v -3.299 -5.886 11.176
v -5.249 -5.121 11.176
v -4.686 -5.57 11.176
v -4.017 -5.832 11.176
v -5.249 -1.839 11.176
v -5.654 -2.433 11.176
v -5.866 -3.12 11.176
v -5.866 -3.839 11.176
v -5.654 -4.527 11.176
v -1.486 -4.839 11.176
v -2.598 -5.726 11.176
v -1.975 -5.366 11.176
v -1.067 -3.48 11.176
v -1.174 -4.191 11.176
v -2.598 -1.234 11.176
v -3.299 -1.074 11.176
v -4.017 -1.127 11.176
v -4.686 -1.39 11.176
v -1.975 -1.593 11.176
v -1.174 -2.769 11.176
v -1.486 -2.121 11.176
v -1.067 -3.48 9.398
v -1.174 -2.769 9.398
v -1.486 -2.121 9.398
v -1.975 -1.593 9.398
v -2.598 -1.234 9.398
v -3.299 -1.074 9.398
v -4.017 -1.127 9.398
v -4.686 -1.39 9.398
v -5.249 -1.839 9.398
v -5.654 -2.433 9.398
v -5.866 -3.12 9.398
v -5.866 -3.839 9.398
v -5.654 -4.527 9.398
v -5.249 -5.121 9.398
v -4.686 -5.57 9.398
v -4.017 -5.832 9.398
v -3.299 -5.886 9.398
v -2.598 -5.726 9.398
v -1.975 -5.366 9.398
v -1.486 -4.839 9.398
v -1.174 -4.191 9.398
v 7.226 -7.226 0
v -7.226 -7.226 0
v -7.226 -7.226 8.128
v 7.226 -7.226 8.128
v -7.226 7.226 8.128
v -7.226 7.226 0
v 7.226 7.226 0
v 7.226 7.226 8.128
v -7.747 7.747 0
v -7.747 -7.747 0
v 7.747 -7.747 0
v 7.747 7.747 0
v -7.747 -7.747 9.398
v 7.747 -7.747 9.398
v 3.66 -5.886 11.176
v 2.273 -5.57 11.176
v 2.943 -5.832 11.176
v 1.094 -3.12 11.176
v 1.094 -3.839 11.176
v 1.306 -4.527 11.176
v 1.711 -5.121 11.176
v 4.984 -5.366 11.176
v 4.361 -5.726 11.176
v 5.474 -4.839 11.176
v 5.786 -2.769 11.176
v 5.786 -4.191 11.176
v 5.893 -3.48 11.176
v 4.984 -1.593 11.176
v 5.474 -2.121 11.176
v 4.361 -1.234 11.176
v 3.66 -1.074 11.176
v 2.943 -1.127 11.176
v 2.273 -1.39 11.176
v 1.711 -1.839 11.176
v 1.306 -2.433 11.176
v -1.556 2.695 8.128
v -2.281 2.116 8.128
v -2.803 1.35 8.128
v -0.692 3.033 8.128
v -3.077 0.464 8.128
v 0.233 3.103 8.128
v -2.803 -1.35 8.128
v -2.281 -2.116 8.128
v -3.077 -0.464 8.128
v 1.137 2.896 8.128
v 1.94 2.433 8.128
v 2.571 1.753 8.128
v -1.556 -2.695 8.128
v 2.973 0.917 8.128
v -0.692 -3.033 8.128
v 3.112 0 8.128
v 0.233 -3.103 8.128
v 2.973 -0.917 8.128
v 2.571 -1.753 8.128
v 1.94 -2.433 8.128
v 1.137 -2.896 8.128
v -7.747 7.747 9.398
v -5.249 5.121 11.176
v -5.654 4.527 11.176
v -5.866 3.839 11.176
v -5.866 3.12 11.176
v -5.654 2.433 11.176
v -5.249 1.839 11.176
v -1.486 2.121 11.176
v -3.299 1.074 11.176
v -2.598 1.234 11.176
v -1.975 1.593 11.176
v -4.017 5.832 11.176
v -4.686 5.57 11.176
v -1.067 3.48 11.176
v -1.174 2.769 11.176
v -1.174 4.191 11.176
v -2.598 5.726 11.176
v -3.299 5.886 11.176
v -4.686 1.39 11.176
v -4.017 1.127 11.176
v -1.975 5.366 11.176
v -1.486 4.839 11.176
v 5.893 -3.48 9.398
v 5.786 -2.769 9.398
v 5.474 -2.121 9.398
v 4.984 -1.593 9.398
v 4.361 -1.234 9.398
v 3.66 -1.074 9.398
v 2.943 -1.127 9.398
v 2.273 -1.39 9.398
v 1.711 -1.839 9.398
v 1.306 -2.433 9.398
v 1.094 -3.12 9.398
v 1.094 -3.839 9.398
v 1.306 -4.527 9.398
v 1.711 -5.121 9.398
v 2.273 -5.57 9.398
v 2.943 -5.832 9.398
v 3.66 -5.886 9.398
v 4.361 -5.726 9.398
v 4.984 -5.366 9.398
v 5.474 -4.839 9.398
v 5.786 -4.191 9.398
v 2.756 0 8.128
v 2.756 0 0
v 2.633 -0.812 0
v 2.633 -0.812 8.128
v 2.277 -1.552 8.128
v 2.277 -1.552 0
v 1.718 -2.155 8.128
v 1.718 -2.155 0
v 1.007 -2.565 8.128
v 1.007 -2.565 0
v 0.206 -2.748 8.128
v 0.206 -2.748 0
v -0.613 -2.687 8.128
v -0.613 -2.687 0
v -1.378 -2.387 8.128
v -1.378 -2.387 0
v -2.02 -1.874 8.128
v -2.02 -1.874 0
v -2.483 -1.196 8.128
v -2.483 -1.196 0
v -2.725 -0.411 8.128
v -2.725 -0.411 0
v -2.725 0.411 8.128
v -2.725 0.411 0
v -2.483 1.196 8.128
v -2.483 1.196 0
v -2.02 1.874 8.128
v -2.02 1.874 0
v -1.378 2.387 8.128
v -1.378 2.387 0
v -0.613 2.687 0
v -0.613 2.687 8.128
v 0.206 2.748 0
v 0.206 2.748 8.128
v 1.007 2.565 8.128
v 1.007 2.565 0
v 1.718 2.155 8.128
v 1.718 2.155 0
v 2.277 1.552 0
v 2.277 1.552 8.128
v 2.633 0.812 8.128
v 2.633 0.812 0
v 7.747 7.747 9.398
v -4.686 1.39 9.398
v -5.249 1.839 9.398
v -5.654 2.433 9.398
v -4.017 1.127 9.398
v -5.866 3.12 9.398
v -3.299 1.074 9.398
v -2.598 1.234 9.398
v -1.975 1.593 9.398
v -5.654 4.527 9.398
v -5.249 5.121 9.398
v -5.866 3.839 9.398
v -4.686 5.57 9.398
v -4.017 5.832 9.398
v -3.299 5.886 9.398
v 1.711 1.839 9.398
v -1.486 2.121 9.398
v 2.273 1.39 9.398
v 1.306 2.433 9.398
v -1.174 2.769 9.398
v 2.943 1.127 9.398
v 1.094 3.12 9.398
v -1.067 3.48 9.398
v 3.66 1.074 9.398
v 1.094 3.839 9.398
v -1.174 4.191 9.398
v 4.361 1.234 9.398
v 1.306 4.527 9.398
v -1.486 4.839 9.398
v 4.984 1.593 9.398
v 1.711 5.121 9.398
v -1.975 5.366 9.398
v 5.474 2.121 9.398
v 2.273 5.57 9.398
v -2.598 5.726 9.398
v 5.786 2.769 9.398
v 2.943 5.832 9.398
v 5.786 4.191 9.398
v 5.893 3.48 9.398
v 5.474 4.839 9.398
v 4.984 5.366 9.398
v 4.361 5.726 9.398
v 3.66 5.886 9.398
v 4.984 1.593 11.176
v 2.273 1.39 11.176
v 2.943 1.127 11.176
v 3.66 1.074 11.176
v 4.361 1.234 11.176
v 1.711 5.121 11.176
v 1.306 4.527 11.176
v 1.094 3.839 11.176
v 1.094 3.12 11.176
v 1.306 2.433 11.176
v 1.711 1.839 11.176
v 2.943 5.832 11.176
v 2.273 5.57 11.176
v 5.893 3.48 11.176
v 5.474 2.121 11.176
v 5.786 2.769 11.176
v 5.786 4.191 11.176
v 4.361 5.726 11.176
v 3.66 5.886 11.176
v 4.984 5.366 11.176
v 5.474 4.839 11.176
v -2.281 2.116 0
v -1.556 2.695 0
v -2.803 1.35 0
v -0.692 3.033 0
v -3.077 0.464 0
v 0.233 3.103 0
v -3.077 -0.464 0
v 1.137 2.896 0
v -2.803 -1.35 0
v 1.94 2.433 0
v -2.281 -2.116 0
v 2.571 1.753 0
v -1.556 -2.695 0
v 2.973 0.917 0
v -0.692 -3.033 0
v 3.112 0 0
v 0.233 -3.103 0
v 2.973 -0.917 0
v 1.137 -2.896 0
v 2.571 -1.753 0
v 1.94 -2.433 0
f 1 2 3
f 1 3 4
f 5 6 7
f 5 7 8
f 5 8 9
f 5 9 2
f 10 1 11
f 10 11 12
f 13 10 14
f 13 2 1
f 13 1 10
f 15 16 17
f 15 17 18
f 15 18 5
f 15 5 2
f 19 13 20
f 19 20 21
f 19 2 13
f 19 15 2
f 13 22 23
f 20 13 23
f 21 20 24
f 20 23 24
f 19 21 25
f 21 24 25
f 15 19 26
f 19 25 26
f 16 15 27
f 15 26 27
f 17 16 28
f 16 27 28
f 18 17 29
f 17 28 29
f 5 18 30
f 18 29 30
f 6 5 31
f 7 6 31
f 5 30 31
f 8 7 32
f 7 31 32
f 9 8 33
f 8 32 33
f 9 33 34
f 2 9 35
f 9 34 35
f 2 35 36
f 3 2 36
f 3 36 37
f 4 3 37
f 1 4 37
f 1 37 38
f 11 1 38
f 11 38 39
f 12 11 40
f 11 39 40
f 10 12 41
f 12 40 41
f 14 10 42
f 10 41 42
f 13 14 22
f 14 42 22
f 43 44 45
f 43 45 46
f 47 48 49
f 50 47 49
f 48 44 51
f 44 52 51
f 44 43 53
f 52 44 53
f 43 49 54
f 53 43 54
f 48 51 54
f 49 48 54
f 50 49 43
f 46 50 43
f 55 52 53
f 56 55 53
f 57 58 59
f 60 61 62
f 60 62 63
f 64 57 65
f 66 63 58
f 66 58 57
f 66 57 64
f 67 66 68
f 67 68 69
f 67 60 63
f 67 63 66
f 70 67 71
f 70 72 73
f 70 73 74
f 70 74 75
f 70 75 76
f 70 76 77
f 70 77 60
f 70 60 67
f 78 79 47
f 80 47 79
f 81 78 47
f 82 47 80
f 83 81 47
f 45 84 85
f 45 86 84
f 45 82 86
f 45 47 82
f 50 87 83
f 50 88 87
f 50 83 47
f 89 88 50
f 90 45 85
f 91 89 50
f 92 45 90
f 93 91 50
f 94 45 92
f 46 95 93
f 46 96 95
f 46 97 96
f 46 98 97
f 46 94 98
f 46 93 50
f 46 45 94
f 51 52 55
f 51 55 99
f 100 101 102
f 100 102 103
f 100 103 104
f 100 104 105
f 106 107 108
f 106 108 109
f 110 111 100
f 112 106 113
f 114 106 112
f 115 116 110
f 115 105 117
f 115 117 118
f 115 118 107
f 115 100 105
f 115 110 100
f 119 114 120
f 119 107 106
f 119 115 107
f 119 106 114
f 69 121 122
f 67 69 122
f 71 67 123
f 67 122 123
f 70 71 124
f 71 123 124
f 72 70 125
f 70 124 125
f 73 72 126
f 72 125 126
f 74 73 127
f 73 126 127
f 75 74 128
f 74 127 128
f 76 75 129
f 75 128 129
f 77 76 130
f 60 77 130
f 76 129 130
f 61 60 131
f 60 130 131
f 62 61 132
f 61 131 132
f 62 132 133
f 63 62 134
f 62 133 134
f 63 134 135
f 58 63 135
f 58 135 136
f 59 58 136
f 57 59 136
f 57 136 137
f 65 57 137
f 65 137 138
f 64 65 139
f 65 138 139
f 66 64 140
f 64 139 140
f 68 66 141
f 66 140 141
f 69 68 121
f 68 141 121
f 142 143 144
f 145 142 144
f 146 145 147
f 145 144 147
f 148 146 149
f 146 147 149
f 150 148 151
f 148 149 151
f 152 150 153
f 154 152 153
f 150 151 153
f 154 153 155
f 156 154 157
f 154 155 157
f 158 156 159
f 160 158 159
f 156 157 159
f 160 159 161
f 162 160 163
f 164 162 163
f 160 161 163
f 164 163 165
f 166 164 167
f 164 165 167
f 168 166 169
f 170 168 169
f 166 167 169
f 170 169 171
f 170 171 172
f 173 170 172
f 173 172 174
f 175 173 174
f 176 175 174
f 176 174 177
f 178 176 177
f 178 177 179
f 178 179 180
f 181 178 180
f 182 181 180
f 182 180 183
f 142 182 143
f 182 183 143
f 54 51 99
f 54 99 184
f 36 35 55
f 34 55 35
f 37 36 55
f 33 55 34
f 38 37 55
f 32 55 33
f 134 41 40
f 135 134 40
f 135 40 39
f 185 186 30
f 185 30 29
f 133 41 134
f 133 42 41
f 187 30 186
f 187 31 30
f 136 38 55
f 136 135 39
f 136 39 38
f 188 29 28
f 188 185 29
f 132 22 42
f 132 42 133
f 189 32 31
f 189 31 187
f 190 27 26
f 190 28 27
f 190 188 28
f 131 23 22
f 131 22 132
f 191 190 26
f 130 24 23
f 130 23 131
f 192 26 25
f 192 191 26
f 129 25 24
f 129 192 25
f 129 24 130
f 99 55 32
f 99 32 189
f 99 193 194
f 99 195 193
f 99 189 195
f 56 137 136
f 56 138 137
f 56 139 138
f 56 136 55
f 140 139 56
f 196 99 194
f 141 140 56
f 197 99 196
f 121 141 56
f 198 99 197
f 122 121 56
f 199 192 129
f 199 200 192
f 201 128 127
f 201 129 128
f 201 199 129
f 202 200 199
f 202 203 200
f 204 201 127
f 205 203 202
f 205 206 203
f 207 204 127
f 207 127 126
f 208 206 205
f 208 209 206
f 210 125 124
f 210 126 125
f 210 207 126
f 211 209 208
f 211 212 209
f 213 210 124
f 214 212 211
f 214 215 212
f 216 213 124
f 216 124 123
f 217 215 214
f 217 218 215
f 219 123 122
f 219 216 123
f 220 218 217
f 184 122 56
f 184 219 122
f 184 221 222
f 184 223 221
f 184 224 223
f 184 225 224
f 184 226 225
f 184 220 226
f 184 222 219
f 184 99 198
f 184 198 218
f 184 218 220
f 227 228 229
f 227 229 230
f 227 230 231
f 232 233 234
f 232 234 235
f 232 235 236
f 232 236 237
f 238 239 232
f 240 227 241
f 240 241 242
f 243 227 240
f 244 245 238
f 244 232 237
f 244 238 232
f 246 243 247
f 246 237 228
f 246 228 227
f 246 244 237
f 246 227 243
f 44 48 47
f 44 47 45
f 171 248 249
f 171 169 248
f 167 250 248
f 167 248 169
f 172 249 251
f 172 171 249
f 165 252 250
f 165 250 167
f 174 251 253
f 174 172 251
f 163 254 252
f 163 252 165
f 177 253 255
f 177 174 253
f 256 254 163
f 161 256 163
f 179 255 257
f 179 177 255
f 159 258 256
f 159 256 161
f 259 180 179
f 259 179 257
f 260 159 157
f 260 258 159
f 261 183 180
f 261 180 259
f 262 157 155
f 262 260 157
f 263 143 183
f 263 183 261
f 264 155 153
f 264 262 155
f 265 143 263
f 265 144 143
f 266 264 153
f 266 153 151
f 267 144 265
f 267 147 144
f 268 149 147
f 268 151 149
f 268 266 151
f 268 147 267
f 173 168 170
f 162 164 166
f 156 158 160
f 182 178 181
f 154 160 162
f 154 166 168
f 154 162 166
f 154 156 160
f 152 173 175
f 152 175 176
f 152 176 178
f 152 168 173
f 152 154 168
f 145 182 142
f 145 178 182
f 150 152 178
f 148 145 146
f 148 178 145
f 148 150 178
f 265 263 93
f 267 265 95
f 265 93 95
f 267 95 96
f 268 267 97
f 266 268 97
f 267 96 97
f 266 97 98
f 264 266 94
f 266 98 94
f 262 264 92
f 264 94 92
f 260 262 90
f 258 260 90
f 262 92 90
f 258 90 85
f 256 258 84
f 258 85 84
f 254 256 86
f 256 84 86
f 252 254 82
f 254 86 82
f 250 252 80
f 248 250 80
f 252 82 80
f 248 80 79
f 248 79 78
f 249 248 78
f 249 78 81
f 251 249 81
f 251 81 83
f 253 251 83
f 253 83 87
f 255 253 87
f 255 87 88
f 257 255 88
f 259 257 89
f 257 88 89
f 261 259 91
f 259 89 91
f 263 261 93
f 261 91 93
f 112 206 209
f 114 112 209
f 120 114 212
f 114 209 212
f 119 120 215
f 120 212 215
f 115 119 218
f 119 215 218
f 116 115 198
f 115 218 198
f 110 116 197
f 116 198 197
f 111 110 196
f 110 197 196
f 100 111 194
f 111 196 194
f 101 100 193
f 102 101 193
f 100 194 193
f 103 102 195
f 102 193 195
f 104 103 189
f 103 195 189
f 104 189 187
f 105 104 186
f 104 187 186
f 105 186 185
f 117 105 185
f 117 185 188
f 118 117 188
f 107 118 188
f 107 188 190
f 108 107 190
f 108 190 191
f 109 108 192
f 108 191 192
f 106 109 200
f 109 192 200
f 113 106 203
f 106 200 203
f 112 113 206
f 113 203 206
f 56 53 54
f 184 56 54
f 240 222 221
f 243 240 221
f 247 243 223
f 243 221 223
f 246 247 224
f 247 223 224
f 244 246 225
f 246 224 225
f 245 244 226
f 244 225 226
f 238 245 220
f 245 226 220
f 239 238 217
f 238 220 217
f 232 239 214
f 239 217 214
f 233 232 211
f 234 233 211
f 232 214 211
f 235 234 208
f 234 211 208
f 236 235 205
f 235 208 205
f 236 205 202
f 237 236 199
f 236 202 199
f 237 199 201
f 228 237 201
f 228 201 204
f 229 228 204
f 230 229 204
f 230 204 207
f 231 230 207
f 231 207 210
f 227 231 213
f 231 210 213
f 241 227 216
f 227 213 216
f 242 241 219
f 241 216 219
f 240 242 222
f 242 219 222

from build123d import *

# Parameters (mm, degrees)
F0_W     = 15.494
F0_H     = 15.494
F1_DEPTH = 9.398
F2_R     = 2.413
F3_DEPTH = 1.778
F4_W     = 14.4526
F4_H     = 14.4526
F5_DEPTH = 8.128
F6_R     = 3.1115
F7_DEPTH = 8.128
F8_R     = 2.7559
F9_DEPTH = 8.128


with BuildPart() as f1:
    # F0 (on Top) → F1 (new body)
    with BuildSketch(Plane.XY):
        Rectangle(F0_W, F0_H)
    extrude(amount=F1_DEPTH)

    # F2 (on face) → F3 (join)
    with BuildSketch(Plane.XY.offset(9.398)):
        with Locations((-3.4798, 3.4798)):
            Circle(F2_R)
        with Locations((3.4798, 3.4798)):
            Circle(F2_R)
        with Locations((3.4798, -3.4798)):
            Circle(F2_R)
        with Locations((-3.4798, -3.4798)):
            Circle(F2_R)
    extrude(amount=F3_DEPTH)

    # F4 (on face) → F5 (cut)
    with BuildSketch(Plane(origin=(0, 0, 0), x_dir=(1, 0, 0), z_dir=(0, 0, -1))):
        Rectangle(F4_W, F4_H)
    extrude(amount=-F5_DEPTH, mode=Mode.SUBTRACT)

    # F6 (on face) → F7 (join)
    with BuildSketch(Plane(origin=(0, 0, 8.128), x_dir=(1, 0, 0), z_dir=(0, 0, -1))):
        Circle(F6_R)
    extrude(amount=F7_DEPTH)

    # F8 (on face) → F9 (cut)
    with BuildSketch(Plane(origin=(0, 0, 0), x_dir=(1, 0, 0), z_dir=(0, 0, -1))):
        Circle(F8_R)
    extrude(amount=-F9_DEPTH, mode=Mode.SUBTRACT)


solid = f1.part
